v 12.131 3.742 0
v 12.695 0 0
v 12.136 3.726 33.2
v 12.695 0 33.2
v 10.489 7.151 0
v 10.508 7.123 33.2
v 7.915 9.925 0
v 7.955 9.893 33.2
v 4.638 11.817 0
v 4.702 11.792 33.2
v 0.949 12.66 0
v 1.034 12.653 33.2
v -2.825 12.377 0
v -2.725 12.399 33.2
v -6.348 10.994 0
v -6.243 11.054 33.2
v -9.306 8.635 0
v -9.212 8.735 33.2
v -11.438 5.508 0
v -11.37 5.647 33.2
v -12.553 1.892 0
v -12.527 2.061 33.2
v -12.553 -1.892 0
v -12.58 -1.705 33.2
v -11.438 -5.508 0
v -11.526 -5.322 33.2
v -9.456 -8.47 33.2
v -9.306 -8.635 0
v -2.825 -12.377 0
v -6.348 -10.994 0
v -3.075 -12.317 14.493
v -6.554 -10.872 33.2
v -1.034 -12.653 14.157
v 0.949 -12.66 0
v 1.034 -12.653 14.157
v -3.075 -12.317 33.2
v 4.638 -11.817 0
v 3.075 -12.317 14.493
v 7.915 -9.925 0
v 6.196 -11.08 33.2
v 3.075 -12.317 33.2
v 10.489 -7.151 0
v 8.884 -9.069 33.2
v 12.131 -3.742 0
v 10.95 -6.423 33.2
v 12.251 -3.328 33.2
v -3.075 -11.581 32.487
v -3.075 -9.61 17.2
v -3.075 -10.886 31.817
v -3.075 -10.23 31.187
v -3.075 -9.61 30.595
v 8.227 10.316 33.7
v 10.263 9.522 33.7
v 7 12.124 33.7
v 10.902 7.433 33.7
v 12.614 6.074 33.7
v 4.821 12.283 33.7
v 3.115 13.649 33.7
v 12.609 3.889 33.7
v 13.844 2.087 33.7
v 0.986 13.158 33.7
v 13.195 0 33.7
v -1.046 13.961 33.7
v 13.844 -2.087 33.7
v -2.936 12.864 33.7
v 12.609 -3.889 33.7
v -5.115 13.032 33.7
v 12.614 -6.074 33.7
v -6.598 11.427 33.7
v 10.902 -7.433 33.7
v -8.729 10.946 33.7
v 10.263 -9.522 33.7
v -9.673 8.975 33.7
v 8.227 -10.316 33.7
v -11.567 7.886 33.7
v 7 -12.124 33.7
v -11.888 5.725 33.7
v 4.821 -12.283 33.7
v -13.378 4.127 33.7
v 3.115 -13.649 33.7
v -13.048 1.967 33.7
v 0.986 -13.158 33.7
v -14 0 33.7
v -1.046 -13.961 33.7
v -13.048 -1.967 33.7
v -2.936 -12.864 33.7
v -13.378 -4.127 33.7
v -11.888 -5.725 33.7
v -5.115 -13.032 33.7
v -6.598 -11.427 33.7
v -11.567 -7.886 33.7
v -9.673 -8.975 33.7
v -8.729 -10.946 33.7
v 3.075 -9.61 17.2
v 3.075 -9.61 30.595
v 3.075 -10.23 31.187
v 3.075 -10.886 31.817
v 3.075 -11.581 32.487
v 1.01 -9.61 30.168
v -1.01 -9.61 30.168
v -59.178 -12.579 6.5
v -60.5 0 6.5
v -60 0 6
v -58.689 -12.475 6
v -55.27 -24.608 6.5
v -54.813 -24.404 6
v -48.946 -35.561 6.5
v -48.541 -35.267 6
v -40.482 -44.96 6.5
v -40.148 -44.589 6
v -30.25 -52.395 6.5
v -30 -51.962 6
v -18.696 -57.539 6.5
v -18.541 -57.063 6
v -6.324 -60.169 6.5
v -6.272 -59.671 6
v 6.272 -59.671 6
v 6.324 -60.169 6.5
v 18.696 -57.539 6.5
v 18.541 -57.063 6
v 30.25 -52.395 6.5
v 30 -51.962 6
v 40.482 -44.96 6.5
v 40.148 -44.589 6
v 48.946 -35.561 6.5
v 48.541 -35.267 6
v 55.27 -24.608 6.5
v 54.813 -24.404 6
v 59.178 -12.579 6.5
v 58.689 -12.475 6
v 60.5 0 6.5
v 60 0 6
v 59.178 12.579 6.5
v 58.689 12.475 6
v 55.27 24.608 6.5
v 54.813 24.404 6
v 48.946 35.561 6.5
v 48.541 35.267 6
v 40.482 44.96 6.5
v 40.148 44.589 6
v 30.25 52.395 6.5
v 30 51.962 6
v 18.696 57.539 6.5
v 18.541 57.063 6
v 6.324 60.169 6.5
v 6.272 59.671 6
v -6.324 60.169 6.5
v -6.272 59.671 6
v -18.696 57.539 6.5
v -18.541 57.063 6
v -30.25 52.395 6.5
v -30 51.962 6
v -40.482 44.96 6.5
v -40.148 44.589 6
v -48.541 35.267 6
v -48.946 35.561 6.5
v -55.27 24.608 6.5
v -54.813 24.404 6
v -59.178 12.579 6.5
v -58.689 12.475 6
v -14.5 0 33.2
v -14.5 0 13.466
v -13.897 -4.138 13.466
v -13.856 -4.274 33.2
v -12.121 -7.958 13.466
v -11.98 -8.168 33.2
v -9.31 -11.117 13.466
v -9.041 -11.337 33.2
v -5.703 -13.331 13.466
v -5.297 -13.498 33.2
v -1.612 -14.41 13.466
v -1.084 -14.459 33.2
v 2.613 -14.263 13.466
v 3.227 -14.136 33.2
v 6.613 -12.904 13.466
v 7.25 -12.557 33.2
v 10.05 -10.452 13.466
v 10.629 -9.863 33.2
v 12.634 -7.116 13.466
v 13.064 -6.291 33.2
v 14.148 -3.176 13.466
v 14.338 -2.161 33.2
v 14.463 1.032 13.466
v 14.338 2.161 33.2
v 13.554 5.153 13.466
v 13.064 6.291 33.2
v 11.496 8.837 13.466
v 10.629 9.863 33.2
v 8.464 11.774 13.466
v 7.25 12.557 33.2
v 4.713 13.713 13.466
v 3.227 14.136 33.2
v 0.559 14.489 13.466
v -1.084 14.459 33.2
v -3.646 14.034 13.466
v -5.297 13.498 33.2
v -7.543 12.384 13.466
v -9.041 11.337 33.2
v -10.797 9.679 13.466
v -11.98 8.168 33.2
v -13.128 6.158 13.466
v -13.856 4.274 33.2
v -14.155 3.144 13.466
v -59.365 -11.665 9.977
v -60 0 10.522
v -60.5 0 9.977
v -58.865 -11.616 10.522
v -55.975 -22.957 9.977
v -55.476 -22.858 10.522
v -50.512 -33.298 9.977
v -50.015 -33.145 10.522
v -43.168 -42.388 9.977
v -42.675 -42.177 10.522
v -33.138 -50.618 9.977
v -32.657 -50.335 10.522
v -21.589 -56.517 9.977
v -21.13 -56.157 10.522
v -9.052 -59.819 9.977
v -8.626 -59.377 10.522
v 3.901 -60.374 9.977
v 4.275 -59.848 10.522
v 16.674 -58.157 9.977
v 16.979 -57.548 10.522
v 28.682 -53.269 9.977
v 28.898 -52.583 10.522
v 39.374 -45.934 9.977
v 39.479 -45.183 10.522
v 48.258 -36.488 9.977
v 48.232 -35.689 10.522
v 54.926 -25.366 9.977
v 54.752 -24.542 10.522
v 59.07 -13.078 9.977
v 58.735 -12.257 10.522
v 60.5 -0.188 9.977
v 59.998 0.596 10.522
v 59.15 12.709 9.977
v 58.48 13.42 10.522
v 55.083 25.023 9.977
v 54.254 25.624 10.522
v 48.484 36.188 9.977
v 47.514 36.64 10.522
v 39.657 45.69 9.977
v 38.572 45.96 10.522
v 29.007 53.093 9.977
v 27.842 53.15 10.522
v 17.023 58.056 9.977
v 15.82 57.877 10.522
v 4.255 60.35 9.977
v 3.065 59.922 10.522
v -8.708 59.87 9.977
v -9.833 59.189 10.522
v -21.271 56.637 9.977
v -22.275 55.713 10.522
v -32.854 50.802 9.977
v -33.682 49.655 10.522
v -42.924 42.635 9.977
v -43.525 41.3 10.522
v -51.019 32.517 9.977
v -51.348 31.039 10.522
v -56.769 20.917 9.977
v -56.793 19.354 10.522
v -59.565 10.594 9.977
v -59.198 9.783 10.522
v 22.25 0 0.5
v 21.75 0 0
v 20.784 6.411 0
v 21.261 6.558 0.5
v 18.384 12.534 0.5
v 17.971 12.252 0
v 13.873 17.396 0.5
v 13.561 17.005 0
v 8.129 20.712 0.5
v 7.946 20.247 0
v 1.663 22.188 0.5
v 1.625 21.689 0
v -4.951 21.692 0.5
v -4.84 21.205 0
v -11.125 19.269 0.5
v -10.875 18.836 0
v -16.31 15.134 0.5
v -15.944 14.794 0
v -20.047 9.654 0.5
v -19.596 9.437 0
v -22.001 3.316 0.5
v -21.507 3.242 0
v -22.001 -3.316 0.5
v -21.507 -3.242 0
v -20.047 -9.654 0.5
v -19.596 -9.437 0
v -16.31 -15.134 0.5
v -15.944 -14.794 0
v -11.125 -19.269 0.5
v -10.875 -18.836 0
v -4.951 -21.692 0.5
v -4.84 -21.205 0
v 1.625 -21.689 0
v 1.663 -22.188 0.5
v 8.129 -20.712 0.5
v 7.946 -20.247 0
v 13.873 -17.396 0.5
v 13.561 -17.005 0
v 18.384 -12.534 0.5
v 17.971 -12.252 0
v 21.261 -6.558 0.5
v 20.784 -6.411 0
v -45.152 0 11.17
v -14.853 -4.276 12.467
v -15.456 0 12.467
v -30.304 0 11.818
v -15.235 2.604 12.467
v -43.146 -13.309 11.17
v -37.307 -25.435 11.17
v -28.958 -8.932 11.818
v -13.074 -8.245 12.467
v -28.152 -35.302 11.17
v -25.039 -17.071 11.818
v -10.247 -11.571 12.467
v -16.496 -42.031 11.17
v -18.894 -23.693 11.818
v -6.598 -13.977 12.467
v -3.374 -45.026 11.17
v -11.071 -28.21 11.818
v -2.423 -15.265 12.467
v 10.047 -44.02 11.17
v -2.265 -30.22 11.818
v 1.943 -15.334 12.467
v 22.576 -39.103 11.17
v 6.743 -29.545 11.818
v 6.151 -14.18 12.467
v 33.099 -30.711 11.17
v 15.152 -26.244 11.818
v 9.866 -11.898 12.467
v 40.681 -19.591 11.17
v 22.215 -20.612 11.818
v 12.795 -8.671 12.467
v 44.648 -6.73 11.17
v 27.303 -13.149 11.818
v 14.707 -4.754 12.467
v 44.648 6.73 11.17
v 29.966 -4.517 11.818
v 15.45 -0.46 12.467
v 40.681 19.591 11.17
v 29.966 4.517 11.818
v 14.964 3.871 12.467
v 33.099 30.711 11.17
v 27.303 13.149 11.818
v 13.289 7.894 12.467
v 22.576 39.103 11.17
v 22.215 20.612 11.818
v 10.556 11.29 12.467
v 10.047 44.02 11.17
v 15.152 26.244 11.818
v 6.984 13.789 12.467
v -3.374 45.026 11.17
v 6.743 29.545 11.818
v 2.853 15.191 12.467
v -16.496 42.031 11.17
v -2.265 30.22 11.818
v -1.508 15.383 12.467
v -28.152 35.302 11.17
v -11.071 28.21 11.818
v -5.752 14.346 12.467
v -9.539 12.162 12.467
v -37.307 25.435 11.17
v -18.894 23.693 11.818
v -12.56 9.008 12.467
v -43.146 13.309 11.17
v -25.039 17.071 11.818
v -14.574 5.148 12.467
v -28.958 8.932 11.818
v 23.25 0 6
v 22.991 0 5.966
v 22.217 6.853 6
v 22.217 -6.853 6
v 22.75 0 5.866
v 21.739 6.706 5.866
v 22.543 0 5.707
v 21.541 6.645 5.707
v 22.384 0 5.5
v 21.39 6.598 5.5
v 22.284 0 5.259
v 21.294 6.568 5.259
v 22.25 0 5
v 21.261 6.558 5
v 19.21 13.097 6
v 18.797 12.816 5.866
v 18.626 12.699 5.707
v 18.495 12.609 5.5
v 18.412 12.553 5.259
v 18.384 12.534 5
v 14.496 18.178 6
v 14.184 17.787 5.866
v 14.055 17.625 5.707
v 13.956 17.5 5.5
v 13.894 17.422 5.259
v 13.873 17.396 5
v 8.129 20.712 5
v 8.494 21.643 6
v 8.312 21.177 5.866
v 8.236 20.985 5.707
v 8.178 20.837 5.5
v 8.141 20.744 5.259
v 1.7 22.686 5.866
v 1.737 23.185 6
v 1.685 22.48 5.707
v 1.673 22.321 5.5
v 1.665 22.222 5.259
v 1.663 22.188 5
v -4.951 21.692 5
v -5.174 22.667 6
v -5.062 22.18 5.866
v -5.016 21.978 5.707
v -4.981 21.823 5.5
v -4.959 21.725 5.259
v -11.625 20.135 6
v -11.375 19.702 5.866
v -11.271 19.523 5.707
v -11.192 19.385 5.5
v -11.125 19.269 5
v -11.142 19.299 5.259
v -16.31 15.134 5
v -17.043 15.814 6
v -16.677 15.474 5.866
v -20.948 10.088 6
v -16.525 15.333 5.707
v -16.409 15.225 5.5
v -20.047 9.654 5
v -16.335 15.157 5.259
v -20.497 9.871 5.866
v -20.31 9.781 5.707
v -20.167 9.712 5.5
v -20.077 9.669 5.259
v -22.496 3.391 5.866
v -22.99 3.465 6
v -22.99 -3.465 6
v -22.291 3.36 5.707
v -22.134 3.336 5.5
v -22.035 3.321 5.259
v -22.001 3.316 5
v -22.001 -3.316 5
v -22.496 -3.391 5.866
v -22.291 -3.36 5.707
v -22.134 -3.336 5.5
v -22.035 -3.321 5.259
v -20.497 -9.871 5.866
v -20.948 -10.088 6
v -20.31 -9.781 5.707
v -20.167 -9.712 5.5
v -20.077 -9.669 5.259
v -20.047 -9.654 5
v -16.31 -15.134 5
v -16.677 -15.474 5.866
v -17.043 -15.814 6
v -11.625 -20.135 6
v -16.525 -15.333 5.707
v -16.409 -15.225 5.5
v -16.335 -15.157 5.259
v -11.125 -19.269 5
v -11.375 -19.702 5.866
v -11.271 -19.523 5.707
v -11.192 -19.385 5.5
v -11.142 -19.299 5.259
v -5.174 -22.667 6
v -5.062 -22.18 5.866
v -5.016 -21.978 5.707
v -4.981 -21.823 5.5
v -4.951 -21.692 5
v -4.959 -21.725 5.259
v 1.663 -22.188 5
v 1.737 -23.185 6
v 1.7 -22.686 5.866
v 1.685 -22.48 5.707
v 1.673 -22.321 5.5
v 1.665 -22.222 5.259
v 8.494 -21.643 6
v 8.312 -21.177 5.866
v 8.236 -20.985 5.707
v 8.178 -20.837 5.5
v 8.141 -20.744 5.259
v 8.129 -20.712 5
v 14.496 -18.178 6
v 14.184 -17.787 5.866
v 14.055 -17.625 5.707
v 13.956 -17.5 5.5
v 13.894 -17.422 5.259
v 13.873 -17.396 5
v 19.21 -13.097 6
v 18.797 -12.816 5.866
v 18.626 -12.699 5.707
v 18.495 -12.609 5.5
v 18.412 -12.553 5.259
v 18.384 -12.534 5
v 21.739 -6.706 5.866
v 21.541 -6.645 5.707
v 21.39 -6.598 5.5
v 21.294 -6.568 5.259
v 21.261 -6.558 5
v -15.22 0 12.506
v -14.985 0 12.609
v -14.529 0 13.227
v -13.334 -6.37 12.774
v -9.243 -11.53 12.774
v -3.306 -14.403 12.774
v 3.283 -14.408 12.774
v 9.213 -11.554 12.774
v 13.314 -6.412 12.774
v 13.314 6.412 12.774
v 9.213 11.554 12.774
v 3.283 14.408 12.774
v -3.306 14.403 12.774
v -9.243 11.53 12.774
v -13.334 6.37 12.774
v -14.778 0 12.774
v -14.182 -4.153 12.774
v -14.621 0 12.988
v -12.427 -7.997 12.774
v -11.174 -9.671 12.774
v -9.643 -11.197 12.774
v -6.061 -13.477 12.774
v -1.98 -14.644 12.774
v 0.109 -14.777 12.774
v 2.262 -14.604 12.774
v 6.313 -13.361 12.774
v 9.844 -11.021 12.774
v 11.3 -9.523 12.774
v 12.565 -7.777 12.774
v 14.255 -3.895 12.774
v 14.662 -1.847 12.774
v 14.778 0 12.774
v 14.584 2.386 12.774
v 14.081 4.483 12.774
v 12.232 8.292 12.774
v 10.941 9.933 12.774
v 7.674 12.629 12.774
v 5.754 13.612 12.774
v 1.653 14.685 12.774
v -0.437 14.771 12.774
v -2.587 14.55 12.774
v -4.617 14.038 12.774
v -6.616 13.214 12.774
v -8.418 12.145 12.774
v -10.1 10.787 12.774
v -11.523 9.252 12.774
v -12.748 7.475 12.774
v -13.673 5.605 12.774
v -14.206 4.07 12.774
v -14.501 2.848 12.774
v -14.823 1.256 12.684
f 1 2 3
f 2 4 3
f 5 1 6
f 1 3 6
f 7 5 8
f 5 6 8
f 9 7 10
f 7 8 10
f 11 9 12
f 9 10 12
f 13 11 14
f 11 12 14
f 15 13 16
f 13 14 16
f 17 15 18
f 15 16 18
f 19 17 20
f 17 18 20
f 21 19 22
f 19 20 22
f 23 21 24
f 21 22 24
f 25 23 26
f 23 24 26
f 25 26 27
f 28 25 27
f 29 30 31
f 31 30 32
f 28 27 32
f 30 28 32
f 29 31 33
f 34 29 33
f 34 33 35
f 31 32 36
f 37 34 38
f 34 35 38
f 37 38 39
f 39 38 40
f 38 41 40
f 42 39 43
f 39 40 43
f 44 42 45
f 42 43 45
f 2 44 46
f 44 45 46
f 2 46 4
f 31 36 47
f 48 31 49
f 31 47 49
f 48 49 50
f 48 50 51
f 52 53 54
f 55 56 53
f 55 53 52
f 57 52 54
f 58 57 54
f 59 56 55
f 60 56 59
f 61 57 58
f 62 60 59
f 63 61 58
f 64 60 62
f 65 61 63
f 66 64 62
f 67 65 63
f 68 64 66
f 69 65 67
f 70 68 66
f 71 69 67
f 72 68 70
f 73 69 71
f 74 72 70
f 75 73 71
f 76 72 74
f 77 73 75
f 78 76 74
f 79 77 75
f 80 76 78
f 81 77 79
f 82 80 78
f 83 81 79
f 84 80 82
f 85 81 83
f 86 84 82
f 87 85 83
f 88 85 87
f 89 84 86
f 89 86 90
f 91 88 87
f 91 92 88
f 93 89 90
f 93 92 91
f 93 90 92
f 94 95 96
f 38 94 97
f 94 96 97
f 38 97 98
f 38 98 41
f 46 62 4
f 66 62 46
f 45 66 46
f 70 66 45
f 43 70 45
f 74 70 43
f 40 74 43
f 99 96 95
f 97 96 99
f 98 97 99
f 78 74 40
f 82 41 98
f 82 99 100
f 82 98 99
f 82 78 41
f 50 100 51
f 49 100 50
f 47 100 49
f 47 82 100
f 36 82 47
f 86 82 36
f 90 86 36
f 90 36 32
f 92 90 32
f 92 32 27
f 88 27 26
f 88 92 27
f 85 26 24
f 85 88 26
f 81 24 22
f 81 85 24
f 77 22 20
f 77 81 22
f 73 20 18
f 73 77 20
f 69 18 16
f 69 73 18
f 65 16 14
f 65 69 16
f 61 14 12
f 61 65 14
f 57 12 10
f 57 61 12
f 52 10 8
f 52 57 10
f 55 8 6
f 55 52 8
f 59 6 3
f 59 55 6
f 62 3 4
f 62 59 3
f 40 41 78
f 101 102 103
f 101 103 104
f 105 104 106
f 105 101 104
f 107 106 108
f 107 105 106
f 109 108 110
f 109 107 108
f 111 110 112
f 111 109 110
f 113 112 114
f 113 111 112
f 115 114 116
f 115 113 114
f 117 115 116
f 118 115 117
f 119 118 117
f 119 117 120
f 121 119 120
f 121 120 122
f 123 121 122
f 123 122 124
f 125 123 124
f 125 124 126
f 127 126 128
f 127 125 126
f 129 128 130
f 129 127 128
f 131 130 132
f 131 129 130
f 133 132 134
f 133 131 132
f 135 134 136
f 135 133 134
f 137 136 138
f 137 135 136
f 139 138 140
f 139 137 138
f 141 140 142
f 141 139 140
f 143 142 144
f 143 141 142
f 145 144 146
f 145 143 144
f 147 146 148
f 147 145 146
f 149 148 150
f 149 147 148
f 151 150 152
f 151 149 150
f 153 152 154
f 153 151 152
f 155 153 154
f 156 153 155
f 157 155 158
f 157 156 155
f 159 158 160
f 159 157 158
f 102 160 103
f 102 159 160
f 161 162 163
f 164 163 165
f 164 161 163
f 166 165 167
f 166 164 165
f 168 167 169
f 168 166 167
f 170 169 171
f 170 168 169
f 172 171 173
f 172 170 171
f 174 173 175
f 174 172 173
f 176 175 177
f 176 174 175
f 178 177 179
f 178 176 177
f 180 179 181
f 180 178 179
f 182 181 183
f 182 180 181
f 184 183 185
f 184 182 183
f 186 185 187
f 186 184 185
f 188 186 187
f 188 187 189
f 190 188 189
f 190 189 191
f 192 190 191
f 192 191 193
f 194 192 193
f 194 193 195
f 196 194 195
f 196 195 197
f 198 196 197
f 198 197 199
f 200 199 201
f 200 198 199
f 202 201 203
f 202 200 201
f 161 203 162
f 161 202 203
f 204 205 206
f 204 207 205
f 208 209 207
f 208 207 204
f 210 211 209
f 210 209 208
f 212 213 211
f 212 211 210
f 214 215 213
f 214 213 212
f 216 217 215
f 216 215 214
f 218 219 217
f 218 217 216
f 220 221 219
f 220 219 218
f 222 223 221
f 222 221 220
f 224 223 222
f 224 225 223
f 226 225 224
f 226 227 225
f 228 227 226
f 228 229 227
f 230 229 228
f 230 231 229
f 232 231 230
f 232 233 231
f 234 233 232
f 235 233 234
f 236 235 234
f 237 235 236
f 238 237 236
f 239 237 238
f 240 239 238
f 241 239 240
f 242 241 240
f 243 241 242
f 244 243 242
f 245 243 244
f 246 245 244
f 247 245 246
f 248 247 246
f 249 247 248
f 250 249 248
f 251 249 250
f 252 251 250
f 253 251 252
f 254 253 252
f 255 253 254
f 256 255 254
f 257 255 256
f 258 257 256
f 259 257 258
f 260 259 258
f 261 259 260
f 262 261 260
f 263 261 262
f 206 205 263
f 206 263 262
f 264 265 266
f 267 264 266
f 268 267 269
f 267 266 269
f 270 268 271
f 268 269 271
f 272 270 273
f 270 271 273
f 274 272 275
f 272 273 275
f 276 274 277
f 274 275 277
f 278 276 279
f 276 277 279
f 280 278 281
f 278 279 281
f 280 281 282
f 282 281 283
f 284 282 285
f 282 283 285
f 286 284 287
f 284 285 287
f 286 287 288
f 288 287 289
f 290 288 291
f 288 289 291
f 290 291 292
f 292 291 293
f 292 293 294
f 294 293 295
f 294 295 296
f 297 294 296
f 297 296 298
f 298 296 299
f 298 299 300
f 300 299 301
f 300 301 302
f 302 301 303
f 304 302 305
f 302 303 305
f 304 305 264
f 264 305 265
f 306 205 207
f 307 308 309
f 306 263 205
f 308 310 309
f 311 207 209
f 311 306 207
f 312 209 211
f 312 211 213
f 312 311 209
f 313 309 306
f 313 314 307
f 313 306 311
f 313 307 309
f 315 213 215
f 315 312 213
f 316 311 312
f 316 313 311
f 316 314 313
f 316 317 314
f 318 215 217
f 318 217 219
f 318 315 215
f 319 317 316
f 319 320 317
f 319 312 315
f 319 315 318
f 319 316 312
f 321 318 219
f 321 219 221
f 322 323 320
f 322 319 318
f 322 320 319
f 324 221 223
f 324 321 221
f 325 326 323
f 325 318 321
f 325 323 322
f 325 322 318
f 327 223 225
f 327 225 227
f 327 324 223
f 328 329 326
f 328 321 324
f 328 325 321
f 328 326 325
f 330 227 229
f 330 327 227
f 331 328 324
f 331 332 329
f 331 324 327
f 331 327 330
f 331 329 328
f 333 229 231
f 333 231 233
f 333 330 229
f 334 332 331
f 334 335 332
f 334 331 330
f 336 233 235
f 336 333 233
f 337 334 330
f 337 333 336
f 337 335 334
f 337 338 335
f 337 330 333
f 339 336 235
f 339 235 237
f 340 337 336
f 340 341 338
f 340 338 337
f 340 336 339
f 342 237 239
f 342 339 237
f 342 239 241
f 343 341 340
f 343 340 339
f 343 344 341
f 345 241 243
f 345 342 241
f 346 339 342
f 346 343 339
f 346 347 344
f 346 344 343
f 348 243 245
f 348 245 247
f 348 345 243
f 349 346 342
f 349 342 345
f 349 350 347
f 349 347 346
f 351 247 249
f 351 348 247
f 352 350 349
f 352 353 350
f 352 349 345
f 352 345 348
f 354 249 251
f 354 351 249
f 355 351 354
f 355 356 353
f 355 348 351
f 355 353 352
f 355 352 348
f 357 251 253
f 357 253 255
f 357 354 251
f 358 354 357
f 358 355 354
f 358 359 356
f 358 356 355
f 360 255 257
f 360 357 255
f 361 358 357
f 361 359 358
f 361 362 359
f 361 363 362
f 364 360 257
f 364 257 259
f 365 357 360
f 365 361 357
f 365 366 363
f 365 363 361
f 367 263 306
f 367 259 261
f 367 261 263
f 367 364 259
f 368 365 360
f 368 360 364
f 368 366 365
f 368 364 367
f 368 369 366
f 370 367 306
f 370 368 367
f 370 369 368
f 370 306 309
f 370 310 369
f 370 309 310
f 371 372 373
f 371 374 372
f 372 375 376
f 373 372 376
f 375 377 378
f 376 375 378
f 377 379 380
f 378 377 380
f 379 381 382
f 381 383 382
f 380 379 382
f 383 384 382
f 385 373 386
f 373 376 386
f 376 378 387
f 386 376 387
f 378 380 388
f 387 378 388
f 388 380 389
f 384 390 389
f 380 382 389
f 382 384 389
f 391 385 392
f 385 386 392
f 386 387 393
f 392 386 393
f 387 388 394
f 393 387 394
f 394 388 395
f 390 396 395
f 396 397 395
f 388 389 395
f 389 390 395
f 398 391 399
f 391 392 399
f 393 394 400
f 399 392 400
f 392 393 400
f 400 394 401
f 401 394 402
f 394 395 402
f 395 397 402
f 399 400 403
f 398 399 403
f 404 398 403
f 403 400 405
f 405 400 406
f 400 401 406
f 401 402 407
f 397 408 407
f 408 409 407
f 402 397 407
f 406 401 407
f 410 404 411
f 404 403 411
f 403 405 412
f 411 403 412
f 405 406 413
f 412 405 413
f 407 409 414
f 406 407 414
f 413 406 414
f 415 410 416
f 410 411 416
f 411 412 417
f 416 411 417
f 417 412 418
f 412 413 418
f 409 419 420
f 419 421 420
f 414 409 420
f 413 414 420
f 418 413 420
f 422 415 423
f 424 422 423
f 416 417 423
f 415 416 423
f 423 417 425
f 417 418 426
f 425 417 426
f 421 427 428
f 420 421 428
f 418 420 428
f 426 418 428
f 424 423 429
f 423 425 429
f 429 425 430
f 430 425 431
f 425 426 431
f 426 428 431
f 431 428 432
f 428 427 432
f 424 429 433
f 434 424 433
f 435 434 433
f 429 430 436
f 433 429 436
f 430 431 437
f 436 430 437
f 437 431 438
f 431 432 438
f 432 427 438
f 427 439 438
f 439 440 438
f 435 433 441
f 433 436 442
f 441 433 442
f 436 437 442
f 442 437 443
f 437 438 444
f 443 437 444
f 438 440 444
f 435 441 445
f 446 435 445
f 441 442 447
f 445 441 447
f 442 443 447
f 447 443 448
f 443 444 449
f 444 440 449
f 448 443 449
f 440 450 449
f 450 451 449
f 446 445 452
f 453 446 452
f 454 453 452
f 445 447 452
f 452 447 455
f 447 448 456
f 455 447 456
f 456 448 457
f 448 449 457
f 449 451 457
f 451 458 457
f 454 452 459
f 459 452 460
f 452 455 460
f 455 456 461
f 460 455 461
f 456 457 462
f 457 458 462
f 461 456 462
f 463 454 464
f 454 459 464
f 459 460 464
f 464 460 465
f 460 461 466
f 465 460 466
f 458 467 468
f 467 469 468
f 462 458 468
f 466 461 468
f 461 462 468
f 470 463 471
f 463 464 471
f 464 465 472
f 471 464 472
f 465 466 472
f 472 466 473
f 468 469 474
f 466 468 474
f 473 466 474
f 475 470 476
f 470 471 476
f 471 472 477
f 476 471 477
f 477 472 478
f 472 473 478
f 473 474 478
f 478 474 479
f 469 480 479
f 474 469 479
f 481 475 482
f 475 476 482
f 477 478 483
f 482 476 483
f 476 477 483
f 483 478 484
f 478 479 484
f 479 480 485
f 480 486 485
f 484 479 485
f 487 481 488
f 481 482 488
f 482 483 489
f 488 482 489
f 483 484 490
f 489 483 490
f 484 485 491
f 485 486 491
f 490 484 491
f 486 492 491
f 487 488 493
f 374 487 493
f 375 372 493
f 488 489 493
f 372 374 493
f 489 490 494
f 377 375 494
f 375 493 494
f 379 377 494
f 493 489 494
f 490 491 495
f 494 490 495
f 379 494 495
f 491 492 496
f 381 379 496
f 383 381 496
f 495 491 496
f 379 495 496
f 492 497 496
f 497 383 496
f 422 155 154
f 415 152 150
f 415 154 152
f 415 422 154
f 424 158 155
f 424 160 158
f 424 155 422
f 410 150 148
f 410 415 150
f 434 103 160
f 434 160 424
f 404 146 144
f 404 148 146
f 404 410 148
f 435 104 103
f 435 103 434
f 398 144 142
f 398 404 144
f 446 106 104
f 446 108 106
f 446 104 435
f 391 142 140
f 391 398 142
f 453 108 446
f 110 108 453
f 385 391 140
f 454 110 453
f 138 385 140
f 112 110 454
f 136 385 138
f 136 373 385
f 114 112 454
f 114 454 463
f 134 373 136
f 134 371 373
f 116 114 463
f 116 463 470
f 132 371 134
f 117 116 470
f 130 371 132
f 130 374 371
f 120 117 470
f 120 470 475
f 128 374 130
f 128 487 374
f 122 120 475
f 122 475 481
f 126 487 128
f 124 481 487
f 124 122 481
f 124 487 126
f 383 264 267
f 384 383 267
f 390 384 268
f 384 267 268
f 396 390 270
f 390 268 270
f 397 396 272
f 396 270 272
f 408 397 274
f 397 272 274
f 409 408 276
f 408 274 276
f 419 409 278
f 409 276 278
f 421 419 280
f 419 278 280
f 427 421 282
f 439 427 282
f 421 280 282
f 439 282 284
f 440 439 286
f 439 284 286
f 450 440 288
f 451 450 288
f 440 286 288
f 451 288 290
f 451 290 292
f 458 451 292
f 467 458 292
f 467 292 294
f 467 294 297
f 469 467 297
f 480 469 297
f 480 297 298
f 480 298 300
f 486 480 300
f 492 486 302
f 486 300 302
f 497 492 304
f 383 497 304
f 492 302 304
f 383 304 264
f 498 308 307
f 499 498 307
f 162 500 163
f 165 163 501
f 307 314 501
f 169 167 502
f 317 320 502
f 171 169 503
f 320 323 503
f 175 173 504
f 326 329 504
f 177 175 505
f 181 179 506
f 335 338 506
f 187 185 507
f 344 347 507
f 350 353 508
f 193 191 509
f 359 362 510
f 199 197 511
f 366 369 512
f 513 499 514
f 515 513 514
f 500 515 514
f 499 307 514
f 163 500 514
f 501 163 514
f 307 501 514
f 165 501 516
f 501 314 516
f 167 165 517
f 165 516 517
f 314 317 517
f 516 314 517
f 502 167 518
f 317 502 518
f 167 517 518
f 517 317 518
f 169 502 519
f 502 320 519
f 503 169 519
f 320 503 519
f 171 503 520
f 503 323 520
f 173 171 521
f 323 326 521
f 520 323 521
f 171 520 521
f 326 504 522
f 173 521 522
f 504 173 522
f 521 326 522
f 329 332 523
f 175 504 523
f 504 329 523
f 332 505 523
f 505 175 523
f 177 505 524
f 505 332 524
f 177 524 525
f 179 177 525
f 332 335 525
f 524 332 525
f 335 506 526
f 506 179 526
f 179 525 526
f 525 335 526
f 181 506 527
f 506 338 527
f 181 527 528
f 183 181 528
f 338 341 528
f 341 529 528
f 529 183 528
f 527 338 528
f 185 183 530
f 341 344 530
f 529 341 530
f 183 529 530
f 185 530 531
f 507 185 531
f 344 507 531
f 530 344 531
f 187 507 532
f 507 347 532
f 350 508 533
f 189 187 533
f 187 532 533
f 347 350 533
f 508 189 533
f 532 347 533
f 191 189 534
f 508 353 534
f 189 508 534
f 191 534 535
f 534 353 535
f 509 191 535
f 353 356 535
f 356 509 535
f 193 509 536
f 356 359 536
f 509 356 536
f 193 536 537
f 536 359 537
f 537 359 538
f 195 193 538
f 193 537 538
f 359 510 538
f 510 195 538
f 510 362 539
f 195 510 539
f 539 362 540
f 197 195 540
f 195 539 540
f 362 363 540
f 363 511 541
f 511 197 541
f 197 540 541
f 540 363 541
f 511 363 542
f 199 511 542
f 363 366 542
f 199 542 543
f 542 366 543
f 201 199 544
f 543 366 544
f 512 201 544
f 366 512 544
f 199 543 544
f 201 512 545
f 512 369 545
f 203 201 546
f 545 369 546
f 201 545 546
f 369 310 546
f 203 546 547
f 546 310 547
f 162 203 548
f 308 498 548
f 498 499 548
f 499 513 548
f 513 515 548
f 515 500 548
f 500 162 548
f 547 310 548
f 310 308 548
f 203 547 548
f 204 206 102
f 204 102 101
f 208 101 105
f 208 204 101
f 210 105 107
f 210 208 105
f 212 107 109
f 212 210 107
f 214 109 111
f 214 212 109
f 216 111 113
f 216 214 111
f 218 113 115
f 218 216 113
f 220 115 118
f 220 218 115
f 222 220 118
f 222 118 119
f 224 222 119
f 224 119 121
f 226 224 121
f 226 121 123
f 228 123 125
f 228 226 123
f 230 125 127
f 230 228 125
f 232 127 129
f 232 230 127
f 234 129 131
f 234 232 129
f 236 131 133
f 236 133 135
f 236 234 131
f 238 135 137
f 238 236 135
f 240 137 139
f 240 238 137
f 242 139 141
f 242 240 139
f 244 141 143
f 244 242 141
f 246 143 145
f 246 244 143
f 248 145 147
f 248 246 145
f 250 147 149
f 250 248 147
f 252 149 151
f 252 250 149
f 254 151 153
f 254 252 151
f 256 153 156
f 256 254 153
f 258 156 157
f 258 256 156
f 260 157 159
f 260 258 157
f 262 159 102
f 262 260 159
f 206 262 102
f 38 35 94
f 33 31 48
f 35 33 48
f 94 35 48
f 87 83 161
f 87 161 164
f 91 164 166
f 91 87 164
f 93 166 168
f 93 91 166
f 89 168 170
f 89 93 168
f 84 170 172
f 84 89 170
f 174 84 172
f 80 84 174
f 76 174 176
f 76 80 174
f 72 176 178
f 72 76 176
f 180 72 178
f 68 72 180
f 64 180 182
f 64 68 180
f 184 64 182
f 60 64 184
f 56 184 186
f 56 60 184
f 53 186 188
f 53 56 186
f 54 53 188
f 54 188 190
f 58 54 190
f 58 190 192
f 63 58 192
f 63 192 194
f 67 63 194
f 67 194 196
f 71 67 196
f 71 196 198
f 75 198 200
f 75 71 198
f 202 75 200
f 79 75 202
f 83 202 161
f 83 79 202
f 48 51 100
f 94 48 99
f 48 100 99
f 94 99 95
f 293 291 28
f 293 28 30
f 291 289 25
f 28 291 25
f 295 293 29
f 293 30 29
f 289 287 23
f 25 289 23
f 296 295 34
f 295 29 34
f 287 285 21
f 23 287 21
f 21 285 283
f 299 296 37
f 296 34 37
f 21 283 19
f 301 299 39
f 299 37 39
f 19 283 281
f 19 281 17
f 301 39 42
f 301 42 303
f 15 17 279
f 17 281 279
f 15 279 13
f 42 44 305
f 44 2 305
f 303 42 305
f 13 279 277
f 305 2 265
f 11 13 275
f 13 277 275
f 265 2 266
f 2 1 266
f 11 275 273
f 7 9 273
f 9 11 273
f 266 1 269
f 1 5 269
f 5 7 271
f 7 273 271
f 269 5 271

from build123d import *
from OCP.BRepFilletAPI import BRepFilletAPI_MakeChamfer

# Parameters (mm, degrees)
SKETCH1_R           = 22.25
BOSS_EXTRUDE1_DEPTH = 6
FILLET1_R           = 1
SKETCH3_R           = 12.695
CUT_EXTRUDE1_DEPTH  = 92.957544552
CHAMFER1_SIZE       = 0.5
CHAMFER1_SIZE2      = 0.523325215
BOSS_EXTRUDE2_DEPTH = 20
CHAMFER2_SIZE       = 3.5
FILLET2_R           = 1


with BuildPart() as part:
    # Sketch1 → Boss-Extrude1 (new body)
    with BuildSketch(Plane.XY):
        Circle(SKETCH1_R)
    extrude(amount=BOSS_EXTRUDE1_DEPTH)

    # Sketch2 → Revolve1 (revolve)
    with BuildSketch(Plane(origin=(0, 0, 0), x_dir=(1, 0, 0), z_dir=(0, 1, 0))):
        Polygon((-14.5, -12.508403374), (-14.5, -33.7), (0, -33.7), (0, -6), (-60.5, -6), (-60.5, -10.5), align=None)
    revolve(axis=Axis((0, 0, 33.7), (0, 0, 1)))

    # Fillet1
    fillet1_edges = [part.edges().sort_by_distance(p)[0] for p in [
        (-22.25, 0, 6),
    ]]
    fillet(fillet1_edges, radius=FILLET1_R)

    # Sketch3 → Cut-Extrude1 (cut, through all)
    with BuildSketch(Plane.XY.offset(33.7)):
        Circle(SKETCH3_R)
    extrude(amount=-CUT_EXTRUDE1_DEPTH, mode=Mode.SUBTRACT)

    # Chamfer1: one chamfer whose edges measure the first distance from different faces: ONE call of the kernel's chamfer builder (chamfer() names one face for all edges)
    chamfer1_edges_1 = [part.edges().sort_by_distance(p)[0] for p in [
        (-22.25, 0, 0),
        (60.5, 0, 6),
        (14.5, 0, 33.7),
    ]]
    chamfer1_edges_2 = [part.edges().sort_by_distance(p)[0] for p in [
        (60.5, 0, 10.5),
    ]]
    chamfer1_side_2 = [part.faces().sort_by_distance(p)[0] for p in [
        (37.5, 0, 11.504201687),
    ]]
    chamfer1 = BRepFilletAPI_MakeChamfer(part.part.solid().wrapped)
    for e in chamfer1_edges_1:
        chamfer1.Add(CHAMFER1_SIZE, e.wrapped)
    for e in chamfer1_edges_2:
        chamfer1.Add(CHAMFER1_SIZE, CHAMFER1_SIZE2, e.wrapped, chamfer1_side_2[0].wrapped)  # the first distance lies on this face
    add(Compound.cast(chamfer1.Shape()), mode=Mode.REPLACE)

    # Sketch4 → Boss-Extrude2 (add)
    with BuildSketch(Plane.XY.offset(33.7)):
        with BuildLine():
            Line((-3.075, -12.316955793), (-3.075, -9.61))
            Line((-3.075, -9.61), (3.075, -9.61))
            Line((3.075, -9.61), (3.075, -12.316955793))
            ThreePointArc((3.075, -12.316955793), (0, -12.695), (-3.075, -12.316955793))
        make_face()
    extrude(amount=-BOSS_EXTRUDE2_DEPTH)

    # Sketch5 → Cut-Revolve1 (revolve, cut)
    with BuildSketch(Plane(origin=(0, 0, 0), x_dir=(1, 0, 0), z_dir=(0, 1, 0)), mode=Mode.PRIVATE) as cut_revolve1_sk:
        Polygon((-12.695, -33.2), (-13.195, -33.7), (-12.695, -33.7), align=None)
        Polygon((-9.195, -33.7), (-12.695, -33.7), (-12.695, -33.2), (-9.195, -29.7), align=None)
    revolve(cut_revolve1_sk.sketch.rotate(Axis((0, 0, 0), (0, 0, -1)), 180), axis=Axis((0, 0, 0), (0, 0, -1)), mode=Mode.SUBTRACT)

    # Chamfer2
    # the kernel refuses this chamfer: 3.5 mm, written as the material it takes off along each edge
    with BuildSketch(Plane(origin=(-12.075890458, -9.61, 13.7), x_dir=(0, -0.9996219169112968, -0.027495876610586605), z_dir=(1, 0, 0))) as chamfer2_piece_1_section:
        Polygon((CHAMFER2_SIZE * 0.999621916911, -CHAMFER2_SIZE * 0.0274958766106), (-CHAMFER2_SIZE * 0.0274958766106, -CHAMFER2_SIZE * 0.999621916911), (0, 0), align=None)
    chamfer2_piece_1 = extrude(amount=24.151780916, mode=Mode.PRIVATE)
    chamfer2_piece_1 = chamfer2_piece_1 & Plane(origin=(0, 0, 14.984613596), x_dir=(1, 0, 0), z_dir=(0, 0, 1)) * Cylinder(12.695, 63, mode=Mode.PRIVATE)
    add(chamfer2_piece_1, mode=Mode.SUBTRACT)

    # Fillet2
    fillet2_edges = [part.edges().sort_by_distance(p)[0] for p in [
        (14.5, 0, 12.508403374),
    ]]
    fillet(fillet2_edges, radius=FILLET2_R)


solid = part.part
